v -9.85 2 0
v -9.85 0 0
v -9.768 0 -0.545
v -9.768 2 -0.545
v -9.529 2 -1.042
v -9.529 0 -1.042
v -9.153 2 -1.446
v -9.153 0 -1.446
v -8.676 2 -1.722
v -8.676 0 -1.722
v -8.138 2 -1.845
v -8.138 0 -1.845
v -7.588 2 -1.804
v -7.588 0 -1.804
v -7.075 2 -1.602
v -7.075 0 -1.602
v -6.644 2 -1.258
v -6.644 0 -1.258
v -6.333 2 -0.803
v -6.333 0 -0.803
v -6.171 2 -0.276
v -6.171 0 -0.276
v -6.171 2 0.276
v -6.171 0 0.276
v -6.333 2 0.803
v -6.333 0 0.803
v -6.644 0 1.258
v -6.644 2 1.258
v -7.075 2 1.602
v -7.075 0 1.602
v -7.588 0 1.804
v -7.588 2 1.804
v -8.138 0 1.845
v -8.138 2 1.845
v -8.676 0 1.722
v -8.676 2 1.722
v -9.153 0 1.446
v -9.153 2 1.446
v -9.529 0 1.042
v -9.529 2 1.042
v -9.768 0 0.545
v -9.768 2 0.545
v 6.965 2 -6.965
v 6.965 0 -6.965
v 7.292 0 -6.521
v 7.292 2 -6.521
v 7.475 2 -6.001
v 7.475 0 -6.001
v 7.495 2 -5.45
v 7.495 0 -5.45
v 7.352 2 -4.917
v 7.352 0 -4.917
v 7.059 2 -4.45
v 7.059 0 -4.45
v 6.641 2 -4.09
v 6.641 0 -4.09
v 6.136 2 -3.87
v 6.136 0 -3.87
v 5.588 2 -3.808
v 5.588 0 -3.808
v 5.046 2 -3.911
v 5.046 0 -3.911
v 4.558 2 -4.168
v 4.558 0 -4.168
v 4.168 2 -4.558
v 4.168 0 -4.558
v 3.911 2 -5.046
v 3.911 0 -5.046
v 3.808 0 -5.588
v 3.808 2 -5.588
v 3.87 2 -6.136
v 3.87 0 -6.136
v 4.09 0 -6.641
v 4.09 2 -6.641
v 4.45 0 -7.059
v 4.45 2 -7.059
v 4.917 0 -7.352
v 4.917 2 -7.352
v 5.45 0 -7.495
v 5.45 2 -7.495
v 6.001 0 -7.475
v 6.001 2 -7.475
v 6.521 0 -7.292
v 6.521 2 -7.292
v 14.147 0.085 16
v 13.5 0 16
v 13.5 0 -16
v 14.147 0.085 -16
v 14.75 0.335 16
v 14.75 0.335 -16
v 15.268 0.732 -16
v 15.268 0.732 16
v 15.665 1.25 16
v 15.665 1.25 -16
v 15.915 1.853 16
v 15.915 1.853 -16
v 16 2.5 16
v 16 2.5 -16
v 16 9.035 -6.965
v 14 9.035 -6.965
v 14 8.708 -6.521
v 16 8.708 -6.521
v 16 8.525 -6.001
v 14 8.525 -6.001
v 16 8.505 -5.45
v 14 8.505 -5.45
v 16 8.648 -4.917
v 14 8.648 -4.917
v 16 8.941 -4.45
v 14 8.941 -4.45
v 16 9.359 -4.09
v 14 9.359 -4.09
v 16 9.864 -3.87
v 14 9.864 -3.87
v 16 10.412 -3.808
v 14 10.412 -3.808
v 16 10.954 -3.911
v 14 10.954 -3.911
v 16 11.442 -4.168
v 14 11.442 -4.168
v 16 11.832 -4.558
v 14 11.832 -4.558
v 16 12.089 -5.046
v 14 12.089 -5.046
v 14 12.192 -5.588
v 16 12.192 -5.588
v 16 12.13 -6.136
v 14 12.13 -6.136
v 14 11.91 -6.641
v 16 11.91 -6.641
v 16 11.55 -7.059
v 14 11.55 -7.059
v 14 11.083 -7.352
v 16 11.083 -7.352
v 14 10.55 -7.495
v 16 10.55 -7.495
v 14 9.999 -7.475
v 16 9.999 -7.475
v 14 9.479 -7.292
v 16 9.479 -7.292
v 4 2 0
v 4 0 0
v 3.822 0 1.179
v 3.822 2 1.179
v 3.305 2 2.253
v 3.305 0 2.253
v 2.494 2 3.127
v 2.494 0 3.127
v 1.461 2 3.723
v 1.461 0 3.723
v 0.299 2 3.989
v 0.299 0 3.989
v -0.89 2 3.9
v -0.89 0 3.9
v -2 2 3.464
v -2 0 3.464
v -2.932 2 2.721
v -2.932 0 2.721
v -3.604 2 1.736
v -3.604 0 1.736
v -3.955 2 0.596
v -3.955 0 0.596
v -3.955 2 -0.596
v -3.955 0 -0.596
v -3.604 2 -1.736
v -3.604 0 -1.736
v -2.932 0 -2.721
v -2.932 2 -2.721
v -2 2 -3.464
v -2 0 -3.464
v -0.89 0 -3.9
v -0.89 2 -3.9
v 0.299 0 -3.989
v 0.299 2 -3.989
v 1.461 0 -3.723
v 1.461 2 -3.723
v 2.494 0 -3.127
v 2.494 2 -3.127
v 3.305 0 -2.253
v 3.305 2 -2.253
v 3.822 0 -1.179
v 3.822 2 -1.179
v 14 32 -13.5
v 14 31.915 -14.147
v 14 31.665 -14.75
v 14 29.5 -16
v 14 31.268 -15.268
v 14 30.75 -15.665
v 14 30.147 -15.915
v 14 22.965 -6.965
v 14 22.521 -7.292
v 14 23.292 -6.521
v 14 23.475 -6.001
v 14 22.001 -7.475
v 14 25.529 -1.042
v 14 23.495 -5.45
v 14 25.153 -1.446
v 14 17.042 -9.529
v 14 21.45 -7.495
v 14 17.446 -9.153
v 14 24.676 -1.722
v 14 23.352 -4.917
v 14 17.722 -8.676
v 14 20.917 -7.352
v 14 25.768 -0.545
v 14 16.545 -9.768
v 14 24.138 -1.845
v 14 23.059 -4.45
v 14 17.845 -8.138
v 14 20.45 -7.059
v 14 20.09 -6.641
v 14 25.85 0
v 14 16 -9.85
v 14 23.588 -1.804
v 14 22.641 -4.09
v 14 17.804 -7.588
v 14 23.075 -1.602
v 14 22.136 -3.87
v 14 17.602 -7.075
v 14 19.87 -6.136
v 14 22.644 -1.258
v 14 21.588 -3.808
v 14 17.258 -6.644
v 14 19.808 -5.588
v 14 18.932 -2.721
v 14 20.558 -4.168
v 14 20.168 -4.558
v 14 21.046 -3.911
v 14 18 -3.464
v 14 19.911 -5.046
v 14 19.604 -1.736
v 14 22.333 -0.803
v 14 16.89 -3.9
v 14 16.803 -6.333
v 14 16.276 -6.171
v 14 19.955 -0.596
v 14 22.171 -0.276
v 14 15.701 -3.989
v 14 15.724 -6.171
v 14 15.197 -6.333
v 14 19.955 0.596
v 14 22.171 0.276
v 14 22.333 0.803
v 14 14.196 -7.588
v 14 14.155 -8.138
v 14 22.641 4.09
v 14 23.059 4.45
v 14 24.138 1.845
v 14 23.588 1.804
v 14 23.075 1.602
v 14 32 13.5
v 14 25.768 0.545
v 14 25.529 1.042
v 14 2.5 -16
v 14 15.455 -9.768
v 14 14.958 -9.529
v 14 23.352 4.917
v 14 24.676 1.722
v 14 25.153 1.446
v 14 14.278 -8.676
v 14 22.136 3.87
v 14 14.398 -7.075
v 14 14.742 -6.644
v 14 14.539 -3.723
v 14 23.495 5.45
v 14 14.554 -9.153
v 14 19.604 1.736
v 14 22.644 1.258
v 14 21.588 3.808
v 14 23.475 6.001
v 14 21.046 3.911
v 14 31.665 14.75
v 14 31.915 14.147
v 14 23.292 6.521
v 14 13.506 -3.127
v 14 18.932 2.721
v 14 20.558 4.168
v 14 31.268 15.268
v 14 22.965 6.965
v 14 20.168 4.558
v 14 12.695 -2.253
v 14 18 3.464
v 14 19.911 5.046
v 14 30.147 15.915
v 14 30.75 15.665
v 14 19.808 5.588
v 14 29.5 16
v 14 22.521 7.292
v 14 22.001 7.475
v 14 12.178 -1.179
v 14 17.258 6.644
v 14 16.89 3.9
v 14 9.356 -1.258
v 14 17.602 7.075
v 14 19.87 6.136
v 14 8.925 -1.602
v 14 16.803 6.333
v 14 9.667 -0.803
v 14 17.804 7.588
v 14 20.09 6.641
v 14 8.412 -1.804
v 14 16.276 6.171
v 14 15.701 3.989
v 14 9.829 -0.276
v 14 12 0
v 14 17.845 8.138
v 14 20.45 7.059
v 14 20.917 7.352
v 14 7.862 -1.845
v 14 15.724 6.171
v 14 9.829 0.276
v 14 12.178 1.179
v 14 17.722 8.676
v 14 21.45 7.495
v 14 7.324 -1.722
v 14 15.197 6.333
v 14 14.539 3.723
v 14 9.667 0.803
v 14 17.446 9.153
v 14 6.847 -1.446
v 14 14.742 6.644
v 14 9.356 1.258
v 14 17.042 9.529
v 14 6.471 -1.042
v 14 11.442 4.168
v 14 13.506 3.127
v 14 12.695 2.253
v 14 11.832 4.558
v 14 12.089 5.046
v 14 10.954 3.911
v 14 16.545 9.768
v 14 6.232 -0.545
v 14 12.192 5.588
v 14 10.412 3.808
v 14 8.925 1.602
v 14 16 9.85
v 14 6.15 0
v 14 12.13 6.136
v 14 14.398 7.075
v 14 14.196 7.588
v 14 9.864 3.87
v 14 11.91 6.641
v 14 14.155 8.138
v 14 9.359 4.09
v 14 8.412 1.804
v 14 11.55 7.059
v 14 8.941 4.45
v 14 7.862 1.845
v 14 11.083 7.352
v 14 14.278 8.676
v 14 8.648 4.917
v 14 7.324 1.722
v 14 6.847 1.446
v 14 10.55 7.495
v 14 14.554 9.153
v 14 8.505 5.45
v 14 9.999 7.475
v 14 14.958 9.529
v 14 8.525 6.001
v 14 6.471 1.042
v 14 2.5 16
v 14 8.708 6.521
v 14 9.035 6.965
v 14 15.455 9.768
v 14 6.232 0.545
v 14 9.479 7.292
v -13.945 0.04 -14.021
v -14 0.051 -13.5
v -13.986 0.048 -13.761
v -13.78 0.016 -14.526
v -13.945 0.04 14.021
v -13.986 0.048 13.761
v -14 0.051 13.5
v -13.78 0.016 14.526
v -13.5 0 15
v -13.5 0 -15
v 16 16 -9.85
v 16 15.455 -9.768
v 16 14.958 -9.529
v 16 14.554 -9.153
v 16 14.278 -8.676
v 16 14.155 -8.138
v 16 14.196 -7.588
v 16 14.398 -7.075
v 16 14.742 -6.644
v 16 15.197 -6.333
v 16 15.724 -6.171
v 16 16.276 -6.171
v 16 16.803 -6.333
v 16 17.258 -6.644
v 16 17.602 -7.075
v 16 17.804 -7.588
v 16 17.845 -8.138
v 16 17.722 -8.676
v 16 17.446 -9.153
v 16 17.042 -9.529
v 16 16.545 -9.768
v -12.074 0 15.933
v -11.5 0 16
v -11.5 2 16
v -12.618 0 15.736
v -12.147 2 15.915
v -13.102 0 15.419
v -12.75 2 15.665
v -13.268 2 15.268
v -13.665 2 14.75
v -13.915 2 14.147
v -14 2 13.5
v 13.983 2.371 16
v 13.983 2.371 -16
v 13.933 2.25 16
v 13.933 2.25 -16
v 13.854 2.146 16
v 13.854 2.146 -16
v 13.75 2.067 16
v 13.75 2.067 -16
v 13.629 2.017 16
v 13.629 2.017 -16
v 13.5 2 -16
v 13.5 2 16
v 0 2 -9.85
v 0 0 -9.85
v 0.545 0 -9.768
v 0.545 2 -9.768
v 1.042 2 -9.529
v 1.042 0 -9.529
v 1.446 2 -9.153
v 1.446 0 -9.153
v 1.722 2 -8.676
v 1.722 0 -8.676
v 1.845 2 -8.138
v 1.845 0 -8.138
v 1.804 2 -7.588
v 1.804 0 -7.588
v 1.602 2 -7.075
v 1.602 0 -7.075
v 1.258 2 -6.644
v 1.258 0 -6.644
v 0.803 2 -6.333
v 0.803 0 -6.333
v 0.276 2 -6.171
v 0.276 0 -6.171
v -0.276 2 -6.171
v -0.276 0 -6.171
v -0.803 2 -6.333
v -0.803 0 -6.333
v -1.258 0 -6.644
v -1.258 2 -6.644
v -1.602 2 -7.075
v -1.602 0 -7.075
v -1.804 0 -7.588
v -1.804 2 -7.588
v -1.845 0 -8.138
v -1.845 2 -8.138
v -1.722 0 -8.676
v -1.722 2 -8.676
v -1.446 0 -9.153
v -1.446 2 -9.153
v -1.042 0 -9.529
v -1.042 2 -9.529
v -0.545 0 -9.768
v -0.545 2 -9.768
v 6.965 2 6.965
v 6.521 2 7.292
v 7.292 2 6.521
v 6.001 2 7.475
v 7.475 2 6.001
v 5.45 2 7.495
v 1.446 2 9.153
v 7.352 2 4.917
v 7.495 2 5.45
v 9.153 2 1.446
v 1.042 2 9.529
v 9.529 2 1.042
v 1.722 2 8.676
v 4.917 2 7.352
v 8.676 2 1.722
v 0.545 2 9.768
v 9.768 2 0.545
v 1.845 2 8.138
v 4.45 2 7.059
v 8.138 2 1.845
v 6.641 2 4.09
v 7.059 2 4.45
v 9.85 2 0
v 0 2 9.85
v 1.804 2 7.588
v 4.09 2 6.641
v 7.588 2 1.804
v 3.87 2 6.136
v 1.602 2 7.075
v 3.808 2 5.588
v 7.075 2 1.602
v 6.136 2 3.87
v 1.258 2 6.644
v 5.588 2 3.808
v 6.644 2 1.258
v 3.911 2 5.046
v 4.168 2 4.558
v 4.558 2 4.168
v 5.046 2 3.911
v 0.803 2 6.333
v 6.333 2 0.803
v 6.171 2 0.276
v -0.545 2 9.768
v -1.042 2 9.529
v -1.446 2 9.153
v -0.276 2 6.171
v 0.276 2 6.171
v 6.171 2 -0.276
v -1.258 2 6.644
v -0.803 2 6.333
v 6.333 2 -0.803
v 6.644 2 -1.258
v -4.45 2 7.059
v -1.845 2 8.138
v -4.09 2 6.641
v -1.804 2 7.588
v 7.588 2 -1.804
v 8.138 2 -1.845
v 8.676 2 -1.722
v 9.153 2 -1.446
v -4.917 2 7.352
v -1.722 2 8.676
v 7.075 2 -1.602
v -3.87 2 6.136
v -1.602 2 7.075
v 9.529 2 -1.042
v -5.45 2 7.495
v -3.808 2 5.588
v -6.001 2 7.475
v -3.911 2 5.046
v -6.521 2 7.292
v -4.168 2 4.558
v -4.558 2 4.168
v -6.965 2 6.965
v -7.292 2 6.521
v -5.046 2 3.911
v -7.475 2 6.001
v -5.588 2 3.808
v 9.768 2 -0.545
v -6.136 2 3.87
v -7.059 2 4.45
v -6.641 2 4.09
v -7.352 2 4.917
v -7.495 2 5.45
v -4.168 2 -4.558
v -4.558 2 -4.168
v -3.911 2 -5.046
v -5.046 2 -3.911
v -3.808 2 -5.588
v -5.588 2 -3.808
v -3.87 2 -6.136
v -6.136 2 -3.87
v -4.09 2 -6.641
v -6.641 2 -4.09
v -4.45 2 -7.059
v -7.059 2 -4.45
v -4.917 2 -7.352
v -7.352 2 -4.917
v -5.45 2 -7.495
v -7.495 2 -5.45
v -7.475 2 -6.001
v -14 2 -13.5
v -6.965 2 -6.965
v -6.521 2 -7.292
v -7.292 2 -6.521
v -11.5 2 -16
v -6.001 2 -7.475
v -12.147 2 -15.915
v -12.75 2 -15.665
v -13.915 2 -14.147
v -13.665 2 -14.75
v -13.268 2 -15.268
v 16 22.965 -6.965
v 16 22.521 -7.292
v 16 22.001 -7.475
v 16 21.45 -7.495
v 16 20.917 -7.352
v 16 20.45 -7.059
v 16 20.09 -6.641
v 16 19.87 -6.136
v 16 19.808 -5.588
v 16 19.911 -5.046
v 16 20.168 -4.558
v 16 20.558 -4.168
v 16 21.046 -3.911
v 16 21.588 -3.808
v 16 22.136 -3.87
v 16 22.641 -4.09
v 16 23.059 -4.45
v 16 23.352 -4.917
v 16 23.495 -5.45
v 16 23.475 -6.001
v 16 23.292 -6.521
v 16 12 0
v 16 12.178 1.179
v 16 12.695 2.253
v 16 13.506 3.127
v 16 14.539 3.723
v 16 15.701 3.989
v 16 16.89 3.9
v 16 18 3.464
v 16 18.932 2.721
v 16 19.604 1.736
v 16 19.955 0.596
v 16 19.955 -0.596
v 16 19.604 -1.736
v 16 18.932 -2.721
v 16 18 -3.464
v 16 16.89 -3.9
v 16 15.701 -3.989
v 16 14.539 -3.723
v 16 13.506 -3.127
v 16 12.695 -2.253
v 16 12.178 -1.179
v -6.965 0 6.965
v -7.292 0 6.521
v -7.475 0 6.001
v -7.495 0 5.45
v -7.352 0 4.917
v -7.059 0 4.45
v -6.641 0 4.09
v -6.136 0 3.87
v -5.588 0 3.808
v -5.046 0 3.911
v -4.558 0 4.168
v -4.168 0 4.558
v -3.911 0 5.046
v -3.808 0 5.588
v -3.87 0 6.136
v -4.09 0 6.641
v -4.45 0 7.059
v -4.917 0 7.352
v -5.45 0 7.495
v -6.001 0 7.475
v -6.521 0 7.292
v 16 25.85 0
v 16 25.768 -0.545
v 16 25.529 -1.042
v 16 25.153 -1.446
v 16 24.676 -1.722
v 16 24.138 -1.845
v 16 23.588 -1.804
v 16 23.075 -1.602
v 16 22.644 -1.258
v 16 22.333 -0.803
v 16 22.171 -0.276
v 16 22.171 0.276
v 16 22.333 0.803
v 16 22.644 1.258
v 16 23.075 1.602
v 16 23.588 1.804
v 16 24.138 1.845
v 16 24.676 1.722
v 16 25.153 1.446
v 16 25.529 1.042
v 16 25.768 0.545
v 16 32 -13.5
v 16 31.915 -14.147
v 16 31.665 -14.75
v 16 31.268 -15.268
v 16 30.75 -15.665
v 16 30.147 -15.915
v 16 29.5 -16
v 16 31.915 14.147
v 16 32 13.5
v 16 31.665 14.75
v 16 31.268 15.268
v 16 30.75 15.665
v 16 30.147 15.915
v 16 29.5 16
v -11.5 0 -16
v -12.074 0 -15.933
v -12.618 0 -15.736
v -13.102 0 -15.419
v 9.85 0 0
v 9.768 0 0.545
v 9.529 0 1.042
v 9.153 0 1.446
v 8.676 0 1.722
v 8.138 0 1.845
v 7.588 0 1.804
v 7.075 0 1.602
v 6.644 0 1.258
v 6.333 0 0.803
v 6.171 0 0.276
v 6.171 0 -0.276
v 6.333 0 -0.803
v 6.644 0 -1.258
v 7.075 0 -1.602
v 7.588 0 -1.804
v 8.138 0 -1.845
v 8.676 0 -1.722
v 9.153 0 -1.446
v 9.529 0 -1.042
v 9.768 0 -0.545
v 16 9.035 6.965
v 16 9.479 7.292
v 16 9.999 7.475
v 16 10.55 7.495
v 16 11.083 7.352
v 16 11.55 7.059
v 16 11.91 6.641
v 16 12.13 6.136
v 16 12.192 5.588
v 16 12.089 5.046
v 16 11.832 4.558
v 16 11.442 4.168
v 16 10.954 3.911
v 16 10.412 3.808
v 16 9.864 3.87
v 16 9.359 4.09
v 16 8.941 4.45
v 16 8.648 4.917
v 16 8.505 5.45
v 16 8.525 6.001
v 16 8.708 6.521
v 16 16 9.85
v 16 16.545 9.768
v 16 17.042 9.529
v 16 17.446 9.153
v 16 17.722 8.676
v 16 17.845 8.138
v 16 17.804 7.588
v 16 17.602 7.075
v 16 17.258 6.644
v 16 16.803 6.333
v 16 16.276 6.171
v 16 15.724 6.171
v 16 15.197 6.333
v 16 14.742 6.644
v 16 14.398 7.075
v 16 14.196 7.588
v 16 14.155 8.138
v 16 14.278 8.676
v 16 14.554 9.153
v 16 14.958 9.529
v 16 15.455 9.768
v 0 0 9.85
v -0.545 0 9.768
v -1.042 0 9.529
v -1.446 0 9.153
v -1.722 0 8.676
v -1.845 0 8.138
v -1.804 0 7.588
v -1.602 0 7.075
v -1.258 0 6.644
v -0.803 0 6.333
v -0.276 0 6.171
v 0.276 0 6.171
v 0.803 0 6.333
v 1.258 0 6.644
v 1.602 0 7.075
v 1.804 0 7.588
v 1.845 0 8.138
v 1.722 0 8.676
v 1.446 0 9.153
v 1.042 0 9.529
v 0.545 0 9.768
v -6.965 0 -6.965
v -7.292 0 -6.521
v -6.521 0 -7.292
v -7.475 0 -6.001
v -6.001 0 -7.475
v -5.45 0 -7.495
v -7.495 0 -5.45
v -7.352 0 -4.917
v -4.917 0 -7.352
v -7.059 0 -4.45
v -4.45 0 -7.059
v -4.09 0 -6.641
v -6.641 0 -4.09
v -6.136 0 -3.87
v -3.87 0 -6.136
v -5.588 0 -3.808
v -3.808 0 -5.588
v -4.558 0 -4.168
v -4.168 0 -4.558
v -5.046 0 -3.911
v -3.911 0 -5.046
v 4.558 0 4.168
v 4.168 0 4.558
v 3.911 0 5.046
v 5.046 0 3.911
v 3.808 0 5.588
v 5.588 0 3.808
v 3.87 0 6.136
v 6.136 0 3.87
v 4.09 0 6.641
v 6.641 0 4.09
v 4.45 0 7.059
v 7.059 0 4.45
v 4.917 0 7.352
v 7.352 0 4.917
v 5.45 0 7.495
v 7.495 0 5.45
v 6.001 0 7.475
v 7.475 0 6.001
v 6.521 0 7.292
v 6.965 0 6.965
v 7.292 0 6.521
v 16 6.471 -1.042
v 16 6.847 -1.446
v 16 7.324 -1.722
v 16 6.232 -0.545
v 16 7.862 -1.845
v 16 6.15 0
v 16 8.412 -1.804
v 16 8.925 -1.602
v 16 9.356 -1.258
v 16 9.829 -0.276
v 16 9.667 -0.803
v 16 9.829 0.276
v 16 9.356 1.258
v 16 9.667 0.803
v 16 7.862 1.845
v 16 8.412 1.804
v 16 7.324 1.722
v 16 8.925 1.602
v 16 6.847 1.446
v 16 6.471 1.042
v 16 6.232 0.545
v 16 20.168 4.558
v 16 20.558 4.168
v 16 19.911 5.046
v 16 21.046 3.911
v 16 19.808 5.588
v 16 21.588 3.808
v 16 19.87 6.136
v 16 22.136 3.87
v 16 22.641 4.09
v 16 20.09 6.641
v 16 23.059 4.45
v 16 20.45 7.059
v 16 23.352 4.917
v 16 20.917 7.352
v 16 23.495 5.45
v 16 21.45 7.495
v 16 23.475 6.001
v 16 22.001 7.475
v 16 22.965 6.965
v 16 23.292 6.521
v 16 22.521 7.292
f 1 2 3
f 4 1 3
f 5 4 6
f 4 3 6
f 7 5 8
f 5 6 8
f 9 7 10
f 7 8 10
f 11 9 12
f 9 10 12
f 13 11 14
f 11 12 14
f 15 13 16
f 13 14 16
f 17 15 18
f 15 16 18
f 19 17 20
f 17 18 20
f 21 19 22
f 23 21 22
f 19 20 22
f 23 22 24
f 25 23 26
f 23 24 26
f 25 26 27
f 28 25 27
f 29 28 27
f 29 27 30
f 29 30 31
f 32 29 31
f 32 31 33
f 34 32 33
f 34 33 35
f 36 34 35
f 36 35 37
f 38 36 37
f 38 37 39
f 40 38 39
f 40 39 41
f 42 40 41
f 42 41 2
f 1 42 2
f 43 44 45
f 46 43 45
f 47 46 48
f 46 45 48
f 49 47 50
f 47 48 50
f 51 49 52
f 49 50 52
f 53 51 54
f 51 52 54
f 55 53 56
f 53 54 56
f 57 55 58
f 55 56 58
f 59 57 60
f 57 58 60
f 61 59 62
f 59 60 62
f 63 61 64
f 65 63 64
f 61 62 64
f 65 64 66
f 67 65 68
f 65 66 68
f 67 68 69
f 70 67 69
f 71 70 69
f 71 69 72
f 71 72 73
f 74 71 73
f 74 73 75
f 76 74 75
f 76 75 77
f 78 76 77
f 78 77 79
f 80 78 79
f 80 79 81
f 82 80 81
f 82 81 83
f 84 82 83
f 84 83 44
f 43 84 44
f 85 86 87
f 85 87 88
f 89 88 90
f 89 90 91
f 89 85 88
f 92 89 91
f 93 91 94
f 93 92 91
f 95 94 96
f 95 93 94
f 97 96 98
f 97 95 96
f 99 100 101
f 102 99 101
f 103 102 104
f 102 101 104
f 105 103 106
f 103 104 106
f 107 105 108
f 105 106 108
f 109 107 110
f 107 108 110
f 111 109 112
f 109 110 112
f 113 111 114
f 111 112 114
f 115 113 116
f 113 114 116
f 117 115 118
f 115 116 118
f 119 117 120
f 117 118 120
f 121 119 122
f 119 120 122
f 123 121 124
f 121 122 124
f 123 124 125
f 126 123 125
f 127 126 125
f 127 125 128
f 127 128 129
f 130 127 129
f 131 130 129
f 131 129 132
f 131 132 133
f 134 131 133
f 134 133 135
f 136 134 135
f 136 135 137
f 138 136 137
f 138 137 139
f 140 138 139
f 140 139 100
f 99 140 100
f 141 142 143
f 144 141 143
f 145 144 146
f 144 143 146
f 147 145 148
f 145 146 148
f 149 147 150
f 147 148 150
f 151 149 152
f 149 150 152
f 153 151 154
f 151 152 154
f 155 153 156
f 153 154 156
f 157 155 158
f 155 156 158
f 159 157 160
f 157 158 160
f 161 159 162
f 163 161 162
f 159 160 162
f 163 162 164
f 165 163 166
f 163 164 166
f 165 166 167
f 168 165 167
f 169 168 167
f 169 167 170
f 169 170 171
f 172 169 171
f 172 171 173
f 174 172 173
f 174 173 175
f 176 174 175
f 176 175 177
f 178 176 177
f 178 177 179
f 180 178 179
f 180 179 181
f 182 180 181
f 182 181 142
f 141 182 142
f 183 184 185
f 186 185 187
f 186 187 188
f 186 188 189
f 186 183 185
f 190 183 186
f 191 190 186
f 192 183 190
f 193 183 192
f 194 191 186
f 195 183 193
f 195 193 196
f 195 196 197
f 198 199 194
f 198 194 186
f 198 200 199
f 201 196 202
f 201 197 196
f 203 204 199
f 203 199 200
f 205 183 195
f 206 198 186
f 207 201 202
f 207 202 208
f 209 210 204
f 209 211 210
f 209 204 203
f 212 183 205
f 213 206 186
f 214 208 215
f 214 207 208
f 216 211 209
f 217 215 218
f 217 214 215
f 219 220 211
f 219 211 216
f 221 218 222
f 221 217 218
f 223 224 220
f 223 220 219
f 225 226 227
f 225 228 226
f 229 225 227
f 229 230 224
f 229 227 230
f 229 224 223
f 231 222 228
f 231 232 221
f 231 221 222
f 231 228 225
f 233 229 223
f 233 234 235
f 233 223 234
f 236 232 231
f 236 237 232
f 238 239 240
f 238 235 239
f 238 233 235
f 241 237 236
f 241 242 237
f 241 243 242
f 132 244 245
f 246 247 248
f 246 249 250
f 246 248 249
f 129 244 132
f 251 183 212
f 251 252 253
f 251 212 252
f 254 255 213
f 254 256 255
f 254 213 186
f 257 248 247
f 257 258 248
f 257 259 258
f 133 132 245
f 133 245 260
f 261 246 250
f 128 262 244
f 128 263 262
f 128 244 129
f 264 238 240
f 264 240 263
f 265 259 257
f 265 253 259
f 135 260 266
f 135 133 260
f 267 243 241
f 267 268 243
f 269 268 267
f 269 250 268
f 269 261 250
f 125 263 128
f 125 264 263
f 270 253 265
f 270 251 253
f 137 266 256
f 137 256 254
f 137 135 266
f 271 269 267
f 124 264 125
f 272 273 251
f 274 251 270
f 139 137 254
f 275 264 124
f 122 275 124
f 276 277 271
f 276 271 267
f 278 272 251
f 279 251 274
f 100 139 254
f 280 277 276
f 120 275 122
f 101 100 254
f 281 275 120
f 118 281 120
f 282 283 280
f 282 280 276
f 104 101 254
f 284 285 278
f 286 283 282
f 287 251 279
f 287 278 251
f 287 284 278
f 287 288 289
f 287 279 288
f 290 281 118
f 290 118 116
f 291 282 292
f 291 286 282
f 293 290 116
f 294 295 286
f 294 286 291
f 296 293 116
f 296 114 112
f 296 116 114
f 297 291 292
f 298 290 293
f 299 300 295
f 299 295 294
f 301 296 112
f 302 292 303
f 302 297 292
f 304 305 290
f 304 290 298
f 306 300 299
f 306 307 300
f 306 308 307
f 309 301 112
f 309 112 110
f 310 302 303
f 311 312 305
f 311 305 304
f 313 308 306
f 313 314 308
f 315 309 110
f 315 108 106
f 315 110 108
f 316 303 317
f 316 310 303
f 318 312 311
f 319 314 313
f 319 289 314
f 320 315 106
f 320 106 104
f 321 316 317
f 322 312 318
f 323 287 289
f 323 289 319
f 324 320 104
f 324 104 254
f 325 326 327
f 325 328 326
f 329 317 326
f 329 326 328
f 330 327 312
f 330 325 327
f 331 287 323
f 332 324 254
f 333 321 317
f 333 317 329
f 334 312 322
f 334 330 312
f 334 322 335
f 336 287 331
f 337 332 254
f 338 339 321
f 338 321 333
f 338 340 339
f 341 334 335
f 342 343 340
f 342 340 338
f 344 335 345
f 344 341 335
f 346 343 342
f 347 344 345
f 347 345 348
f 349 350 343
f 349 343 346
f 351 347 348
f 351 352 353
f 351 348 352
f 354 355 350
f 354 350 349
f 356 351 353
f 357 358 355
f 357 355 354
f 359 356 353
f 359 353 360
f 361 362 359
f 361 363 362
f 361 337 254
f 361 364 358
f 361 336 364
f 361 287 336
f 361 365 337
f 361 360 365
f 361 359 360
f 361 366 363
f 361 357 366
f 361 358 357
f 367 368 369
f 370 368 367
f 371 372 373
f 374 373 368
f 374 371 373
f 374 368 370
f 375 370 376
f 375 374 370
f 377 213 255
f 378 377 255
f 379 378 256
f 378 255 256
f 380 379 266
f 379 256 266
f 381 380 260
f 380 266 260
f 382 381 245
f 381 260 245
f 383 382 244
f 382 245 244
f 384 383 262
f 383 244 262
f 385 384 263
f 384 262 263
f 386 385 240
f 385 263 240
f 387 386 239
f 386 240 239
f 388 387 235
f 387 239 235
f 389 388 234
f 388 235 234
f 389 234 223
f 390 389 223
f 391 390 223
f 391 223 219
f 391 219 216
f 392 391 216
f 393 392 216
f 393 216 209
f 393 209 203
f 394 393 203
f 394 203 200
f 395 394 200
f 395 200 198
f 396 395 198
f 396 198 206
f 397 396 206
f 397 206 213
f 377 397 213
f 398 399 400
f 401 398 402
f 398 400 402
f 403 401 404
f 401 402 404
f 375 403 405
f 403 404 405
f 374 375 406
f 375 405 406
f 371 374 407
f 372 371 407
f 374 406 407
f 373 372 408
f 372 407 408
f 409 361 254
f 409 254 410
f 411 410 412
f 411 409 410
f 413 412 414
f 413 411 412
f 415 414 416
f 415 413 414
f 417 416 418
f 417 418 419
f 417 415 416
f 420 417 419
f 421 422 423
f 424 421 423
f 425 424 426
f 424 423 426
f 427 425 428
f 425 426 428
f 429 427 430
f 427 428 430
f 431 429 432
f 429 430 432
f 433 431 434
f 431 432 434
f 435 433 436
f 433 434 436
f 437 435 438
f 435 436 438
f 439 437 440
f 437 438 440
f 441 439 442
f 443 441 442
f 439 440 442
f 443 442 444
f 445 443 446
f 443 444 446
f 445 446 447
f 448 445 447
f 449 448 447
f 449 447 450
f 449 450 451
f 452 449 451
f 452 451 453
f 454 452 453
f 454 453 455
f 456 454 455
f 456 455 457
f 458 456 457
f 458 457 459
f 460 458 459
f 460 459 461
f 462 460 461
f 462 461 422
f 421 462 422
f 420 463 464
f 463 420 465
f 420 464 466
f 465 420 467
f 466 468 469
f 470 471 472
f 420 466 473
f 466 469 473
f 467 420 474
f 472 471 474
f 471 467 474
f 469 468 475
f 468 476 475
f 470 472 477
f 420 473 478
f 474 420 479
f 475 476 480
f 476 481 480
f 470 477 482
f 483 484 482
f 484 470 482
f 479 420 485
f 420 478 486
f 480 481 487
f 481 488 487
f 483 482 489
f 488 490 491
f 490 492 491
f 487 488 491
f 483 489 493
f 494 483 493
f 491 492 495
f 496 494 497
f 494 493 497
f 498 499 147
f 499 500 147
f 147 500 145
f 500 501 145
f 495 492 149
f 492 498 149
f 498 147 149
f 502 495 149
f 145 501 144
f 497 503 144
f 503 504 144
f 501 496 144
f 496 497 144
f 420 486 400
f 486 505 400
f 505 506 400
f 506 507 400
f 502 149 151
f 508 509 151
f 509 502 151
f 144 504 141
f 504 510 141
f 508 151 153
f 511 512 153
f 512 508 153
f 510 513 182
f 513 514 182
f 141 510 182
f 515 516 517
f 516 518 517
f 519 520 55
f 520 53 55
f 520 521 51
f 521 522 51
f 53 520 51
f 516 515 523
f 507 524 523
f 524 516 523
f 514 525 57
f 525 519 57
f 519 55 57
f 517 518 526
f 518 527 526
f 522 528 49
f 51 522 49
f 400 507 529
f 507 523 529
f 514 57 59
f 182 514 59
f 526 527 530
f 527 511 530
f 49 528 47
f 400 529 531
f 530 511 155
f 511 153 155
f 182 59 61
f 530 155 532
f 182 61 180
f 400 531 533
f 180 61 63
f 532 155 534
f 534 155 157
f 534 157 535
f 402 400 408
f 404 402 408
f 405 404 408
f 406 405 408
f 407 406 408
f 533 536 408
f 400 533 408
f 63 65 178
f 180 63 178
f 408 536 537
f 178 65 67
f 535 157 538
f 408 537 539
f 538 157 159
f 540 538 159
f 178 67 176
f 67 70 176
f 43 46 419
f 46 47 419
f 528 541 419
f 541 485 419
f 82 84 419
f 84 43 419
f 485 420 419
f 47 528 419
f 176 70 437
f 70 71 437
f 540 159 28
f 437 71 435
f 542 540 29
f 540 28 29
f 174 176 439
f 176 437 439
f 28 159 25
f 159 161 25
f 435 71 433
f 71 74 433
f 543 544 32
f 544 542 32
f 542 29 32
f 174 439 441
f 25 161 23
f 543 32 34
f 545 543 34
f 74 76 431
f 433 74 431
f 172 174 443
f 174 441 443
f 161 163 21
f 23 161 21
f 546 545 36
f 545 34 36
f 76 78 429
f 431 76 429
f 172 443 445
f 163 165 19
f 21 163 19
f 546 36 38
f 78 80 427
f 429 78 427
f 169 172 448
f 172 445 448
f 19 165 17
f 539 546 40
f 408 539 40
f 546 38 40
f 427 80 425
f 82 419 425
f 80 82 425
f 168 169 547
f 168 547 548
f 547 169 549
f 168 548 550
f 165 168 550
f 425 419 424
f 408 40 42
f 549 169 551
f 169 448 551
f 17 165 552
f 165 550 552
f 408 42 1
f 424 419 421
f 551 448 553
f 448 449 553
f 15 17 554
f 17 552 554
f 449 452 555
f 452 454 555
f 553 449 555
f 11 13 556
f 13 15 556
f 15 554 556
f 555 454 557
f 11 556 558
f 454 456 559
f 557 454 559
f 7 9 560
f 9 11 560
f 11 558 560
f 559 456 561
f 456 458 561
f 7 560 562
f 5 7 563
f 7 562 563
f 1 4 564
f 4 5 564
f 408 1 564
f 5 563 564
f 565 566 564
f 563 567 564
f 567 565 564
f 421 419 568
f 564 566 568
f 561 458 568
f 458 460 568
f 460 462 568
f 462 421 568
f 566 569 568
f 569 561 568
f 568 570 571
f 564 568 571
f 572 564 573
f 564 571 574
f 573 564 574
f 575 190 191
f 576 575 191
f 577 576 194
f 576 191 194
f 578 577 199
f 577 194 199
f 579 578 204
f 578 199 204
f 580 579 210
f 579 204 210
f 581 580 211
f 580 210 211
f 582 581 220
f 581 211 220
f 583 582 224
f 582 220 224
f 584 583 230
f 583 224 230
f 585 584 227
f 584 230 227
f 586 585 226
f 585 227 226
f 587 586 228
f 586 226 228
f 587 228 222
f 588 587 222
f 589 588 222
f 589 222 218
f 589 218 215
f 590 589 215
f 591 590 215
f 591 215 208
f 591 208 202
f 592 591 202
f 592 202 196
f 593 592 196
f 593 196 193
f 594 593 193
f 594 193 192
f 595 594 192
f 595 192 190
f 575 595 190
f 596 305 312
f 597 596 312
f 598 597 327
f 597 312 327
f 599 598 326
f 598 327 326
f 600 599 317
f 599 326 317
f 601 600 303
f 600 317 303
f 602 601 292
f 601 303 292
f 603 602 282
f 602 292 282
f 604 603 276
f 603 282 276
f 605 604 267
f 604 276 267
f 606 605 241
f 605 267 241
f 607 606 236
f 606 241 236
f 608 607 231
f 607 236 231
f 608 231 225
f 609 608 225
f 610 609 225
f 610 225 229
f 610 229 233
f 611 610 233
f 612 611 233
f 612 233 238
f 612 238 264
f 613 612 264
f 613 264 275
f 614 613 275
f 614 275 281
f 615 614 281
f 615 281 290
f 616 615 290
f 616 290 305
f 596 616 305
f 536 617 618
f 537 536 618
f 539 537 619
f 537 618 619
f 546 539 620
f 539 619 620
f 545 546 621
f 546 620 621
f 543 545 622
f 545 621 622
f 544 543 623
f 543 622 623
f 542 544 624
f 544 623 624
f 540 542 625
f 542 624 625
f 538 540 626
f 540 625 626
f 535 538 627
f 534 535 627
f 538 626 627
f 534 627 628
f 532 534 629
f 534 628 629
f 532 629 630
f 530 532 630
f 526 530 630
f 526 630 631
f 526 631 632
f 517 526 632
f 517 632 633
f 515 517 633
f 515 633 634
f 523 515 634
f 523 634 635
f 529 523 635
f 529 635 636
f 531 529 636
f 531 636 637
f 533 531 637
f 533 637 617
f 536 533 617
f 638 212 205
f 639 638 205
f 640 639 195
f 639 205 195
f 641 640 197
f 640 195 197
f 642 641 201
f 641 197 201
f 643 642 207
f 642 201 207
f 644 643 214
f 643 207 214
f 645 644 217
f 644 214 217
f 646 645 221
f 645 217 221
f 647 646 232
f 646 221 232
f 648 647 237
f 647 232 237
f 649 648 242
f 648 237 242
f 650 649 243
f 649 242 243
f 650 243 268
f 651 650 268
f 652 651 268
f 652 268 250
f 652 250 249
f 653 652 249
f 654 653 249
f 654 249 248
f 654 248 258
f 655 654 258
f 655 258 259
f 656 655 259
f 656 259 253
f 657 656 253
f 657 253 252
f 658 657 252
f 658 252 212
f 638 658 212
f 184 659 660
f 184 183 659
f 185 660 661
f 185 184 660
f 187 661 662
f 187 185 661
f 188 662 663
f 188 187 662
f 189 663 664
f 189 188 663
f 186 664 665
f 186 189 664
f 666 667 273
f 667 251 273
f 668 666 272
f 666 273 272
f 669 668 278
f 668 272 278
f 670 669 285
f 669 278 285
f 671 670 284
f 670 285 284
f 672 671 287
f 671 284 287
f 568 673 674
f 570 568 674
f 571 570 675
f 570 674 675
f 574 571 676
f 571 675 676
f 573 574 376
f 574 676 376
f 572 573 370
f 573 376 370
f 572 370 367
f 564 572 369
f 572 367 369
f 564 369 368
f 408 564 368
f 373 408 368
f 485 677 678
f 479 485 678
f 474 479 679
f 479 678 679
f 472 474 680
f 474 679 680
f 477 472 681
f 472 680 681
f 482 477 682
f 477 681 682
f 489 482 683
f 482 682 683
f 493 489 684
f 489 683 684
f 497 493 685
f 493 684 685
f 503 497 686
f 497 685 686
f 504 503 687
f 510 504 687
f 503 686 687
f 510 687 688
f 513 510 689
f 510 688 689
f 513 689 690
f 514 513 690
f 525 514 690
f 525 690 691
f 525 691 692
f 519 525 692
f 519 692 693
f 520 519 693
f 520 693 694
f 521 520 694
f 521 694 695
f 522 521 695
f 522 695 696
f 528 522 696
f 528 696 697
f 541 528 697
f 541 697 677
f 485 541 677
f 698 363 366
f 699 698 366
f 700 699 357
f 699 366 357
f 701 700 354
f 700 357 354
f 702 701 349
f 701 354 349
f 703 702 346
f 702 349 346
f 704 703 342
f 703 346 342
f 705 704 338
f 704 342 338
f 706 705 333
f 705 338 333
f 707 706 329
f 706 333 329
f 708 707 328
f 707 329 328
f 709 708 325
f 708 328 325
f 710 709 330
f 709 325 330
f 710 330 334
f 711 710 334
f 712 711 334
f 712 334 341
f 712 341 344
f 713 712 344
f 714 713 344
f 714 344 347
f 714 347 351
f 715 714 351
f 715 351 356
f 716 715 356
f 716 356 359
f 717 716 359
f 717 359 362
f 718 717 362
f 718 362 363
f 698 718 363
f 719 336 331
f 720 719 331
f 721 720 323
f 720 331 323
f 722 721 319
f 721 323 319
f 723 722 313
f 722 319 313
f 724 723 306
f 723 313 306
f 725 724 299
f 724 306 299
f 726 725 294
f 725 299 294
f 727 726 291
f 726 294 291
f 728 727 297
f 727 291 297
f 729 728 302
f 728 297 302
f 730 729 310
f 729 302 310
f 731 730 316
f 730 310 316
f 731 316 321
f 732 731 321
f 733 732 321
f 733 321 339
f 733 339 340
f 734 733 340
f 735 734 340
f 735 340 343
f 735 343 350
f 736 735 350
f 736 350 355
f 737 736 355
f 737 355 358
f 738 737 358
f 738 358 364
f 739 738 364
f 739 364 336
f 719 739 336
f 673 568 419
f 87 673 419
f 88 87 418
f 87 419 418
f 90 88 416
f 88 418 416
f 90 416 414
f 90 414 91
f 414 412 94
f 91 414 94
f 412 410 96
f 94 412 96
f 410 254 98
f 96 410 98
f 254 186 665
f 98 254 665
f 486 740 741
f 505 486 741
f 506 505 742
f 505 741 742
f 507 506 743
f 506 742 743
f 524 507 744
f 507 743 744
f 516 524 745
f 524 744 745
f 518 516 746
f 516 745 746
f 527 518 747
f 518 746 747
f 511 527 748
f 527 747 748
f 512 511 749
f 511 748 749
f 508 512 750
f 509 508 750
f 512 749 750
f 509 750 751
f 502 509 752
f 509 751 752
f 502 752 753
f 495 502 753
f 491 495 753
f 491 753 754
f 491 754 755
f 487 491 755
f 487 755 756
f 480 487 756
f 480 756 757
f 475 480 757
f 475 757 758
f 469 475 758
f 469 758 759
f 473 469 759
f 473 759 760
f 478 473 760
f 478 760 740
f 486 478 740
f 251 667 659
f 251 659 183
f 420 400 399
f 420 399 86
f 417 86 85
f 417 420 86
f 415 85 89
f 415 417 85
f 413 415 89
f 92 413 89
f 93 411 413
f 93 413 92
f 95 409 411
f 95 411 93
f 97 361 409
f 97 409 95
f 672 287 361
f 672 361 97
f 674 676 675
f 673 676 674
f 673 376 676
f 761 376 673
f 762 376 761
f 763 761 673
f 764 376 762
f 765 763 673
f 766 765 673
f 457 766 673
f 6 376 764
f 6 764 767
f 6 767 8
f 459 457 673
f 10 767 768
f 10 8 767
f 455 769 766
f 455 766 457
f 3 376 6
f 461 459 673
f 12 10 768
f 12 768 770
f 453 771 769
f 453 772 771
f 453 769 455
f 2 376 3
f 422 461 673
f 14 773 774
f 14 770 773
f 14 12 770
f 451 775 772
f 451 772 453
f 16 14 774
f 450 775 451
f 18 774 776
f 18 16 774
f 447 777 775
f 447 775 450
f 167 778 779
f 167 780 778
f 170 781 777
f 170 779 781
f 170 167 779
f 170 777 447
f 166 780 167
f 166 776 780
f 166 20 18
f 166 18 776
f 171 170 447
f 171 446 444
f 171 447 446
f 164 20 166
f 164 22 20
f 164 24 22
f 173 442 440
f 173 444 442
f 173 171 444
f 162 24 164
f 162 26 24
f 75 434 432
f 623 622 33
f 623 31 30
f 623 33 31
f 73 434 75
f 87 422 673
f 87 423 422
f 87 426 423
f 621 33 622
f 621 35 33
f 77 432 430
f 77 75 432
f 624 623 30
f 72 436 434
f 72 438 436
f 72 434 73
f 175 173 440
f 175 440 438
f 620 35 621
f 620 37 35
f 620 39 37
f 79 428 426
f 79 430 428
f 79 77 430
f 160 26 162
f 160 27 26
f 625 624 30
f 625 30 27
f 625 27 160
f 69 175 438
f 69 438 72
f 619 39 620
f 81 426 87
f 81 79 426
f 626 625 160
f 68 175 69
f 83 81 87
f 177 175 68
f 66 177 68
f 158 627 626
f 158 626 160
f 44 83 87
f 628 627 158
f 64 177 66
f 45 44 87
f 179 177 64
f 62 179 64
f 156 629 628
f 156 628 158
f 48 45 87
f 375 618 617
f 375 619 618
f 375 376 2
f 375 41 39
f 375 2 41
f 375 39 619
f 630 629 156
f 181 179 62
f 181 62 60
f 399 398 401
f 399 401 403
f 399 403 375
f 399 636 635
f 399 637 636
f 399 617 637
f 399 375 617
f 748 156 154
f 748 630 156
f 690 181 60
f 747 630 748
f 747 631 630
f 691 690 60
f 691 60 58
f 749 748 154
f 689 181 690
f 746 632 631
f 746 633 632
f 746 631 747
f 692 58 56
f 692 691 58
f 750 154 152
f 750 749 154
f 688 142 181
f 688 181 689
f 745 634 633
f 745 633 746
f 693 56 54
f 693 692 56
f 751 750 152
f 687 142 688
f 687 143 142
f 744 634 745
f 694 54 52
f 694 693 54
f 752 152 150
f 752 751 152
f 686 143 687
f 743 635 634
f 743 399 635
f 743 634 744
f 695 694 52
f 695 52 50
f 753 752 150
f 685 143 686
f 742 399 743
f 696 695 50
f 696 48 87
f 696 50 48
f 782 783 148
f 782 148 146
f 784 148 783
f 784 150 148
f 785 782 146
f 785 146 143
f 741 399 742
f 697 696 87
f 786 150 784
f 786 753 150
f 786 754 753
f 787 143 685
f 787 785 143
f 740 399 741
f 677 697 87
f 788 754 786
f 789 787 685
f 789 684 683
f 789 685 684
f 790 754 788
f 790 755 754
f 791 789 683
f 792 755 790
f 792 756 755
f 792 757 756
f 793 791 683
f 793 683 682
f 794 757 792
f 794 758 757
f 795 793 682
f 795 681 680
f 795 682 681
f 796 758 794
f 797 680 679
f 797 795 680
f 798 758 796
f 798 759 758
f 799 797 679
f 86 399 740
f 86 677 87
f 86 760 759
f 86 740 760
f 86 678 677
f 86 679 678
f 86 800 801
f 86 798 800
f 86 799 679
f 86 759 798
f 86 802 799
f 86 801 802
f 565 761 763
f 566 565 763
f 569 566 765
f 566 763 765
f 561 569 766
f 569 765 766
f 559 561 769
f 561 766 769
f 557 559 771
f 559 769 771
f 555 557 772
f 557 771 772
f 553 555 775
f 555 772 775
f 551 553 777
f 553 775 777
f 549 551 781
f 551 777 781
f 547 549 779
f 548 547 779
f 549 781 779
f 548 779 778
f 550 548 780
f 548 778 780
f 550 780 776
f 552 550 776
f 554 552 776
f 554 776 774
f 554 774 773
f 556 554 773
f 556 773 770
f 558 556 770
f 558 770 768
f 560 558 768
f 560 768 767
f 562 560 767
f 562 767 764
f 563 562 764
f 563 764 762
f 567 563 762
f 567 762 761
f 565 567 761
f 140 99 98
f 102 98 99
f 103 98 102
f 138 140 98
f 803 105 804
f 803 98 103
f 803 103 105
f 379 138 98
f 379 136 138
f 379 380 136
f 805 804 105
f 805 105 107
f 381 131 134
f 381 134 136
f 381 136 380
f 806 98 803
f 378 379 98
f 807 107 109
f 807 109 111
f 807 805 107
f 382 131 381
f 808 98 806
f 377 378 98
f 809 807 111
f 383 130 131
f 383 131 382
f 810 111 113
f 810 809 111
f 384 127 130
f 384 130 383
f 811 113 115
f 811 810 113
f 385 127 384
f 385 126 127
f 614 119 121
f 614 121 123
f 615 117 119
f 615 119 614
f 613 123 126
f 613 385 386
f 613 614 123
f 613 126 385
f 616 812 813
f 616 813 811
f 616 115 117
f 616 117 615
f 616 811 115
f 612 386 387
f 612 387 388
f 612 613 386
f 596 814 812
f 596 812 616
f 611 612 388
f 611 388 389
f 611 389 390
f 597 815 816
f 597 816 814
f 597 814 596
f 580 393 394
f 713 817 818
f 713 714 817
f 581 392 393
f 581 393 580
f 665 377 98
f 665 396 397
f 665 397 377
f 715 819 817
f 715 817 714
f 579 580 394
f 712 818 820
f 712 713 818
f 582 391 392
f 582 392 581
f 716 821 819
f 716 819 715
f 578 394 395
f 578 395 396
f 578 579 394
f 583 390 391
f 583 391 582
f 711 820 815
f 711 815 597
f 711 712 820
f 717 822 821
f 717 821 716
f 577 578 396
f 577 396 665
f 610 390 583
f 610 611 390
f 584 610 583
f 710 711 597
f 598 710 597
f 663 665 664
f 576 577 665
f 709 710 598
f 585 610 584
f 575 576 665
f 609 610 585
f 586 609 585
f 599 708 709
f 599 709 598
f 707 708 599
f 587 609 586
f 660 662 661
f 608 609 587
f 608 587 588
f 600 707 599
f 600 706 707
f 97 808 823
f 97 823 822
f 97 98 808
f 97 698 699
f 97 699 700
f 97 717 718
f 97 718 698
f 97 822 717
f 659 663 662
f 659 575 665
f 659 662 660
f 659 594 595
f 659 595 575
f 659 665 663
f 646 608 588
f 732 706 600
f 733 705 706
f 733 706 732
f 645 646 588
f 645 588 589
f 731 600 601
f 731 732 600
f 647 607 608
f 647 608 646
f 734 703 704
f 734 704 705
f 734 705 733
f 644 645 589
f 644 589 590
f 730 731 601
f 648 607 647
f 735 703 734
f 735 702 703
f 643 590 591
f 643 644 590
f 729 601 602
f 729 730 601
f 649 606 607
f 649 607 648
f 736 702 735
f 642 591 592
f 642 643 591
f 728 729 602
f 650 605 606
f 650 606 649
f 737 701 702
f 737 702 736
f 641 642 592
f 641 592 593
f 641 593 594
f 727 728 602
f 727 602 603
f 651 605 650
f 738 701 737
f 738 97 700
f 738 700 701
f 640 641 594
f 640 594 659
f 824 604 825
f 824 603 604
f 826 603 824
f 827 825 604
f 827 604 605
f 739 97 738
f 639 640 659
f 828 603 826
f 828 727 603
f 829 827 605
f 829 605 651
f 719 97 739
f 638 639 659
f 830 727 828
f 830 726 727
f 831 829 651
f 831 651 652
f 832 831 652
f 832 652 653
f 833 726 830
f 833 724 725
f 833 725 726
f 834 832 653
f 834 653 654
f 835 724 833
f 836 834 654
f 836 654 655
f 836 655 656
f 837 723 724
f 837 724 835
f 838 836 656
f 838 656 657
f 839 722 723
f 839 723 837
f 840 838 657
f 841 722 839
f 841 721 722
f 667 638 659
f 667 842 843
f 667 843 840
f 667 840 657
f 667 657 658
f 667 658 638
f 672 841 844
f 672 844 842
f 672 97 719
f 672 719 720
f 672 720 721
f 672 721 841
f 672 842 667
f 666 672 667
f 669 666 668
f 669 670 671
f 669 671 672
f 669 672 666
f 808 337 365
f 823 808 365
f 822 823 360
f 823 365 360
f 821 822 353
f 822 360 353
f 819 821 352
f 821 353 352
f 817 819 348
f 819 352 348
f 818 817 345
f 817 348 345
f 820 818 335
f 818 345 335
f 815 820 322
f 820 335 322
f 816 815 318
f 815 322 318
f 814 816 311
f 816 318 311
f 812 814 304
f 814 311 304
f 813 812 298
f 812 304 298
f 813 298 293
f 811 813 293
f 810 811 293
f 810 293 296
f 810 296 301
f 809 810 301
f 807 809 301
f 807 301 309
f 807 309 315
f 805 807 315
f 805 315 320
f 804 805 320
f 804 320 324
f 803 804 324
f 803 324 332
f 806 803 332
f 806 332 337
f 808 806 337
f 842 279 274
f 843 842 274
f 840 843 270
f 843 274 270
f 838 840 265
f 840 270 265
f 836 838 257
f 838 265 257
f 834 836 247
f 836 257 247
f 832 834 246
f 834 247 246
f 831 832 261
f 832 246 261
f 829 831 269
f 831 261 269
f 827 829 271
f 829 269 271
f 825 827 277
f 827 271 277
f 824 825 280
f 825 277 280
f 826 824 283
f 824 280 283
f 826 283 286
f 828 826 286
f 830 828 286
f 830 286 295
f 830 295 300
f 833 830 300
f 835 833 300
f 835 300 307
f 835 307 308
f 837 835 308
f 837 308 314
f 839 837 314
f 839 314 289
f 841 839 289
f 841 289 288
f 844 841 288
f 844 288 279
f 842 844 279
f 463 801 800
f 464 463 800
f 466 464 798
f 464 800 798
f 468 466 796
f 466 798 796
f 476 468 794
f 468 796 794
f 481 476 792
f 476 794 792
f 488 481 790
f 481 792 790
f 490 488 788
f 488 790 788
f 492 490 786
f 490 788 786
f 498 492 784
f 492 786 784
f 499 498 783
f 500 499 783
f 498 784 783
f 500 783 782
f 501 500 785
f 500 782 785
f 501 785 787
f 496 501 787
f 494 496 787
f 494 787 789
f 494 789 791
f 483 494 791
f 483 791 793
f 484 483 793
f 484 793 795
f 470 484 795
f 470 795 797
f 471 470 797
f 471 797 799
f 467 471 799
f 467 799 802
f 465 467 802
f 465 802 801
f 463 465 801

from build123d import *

# Parameters (mm, degrees)
EXTRUDE1_DEPTH     = 16
FILLET1_R          = 2.5
SKETCH2_R          = 4
CUT_EXTRUDE1_DEPTH = 40.191835885
SKETCH3_R          = 4
CUT_EXTRUDE3_DEPTH = 49
SKETCH3_3_R        = 1.85
CUT_EXTRUDE4_DEPTH = 49
SKETCH2_4_R        = 1.85
CUT_EXTRUDE2_DEPTH = 40.191835885
CIRPATTERN1_COUNT  = 8
CIRPATTERN3_COUNT  = 8
CUT_EXTRUDE5_DEPTH = 49
CUT_EXTRUDE7_DEPTH = 49
FILLET2_R          = 2.5


with BuildPart() as part:
    # Sketch1 → Extrude1 (new, symmetric)
    with BuildSketch(Plane.XY):
        with BuildLine():
            Line((-13.5, 0), (13.5, 0))
            ThreePointArc((13.5, 0), (15.267766953, 0.732233047), (16, 2.5))
            Line((16, 2.5), (16, 32))
            Line((16, 32), (14, 32))
            Line((14, 32), (14, 2.5))
            ThreePointArc((14, 2.5), (13.853553391, 2.146446609), (13.5, 2))
            Line((13.5, 2), (-13.5, 2))
            ThreePointArc((-13.5, 2), (-13.853553391, 2.146446609), (-14, 2.5))
            Line((-14, 2.5), (-14, 32))
            Line((-14, 32), (-16, 32))
            Line((-16, 32), (-16, 2.5))
            ThreePointArc((-16, 2.5), (-15.267766953, 0.732233047), (-13.5, 0))
        make_face()
    extrude(amount=EXTRUDE1_DEPTH, both=True)

    # Fillet1
    fillet1_edges = [part.edges().sort_by_distance(p)[0] for p in [
        (-15, 32, -16),
        (-15, 32, 16),
        (15, 32, -16),
        (15, 32, 16),
    ]]
    fillet(fillet1_edges, radius=FILLET1_R)

    # Sketch2 → Cut-Extrude1 (cut, through all)
    with BuildSketch(Plane.XZ):
        Circle(SKETCH2_R)
    extrude(amount=-CUT_EXTRUDE1_DEPTH, mode=Mode.SUBTRACT)

    # Sketch3 → Cut-Extrude3 (cut, through all)
    with BuildSketch(Plane.ZY.offset(16)):
        with Locations(Location((0, 16, 0), (0, 0, 270))):
            Circle(SKETCH3_R)
    extrude(amount=-CUT_EXTRUDE3_DEPTH, mode=Mode.SUBTRACT)

    # Sketch3<3> → Cut-Extrude4 (cut, through all)
    with BuildSketch(Plane.ZY.offset(16)):
        with Locations(Location((0, 8, 0), (0, 0, 270))):
            Circle(SKETCH3_3_R)
    cut_extrude4 = extrude(amount=-CUT_EXTRUDE4_DEPTH, mode=Mode.SUBTRACT)

    # Sketch2<4> → Cut-Extrude2 (cut, through all)
    with BuildSketch(Plane.XZ):
        with Locations((8, 0)):
            Circle(SKETCH2_4_R)
    cut_extrude2 = extrude(amount=-CUT_EXTRUDE2_DEPTH, mode=Mode.SUBTRACT)

    # CirPattern1: Cut-Extrude2 ×8 about axis
    cirpattern1_axis = Axis((0, 0, 0), (0, 1, 0))
    for i in range(1, CIRPATTERN1_COUNT):
        add(cut_extrude2.rotate(cirpattern1_axis, i * 360 / CIRPATTERN1_COUNT), mode=Mode.SUBTRACT)

    # CirPattern3: Cut-Extrude4 ×8 about axis
    cirpattern3_axis = Axis((0, 16, 0), (1, 0, 0))
    for i in range(1, CIRPATTERN3_COUNT):
        add(cut_extrude4.rotate(cirpattern3_axis, i * 360 / CIRPATTERN3_COUNT), mode=Mode.SUBTRACT)

    # Sketch4 → Cut-Extrude5 (cut, through all)
    with BuildSketch(Plane(origin=(0, 0, -16), x_dir=(-1, 0, 0), z_dir=(0, 0, -1))):
        with BuildLine():
            Line((14, 29.5), (14, 2.5))
            Line((14, 2.5), (14, 0.050510257))
            ThreePointArc((14, 0.050510257), (15.436491673, 0.91886117), (16, 2.5))
            Line((16, 2.5), (16, 29.5))
            Line((16, 29.5), (14, 29.5))
        make_face()
        with BuildLine():
            ThreePointArc((16, 2.5), (15.436491673, 0.91886117), (14, 0.050510257))
            Line((14, 0.050510257), (14, -1.144356578))
            Line((14, -1.144356578), (16.915765157, -1.144356578))
            Line((16.915765157, -1.144356578), (16.915765157, 33.185918655))
            Line((16.915765157, 33.185918655), (14, 33.185918655))
            Line((14, 33.185918655), (14, 29.5))
            Line((14, 29.5), (16, 29.5))
            Line((16, 29.5), (16, 2.5))
        make_face()
    extrude(amount=-CUT_EXTRUDE5_DEPTH, mode=Mode.SUBTRACT)

    # Sketch5 → Cut-Extrude7 (cut, through all)
    with BuildSketch(Plane(origin=(0, 0, -16), x_dir=(-1, 0, 0), z_dir=(0, 0, -1))):
        Polygon((13.5, 2), (15.292334009, 2), (14.396167004, 3.92414695), align=None)
    extrude(amount=-CUT_EXTRUDE7_DEPTH, mode=Mode.SUBTRACT)

    # Fillet2
    fillet2_edges = [part.edges().sort_by_distance(p)[0] for p in [
        (-14, 1.025255129, 16),
        (-14, 1.025255129, -16),
    ]]
    fillet(fillet2_edges, radius=FILLET2_R)


solid = part.part
